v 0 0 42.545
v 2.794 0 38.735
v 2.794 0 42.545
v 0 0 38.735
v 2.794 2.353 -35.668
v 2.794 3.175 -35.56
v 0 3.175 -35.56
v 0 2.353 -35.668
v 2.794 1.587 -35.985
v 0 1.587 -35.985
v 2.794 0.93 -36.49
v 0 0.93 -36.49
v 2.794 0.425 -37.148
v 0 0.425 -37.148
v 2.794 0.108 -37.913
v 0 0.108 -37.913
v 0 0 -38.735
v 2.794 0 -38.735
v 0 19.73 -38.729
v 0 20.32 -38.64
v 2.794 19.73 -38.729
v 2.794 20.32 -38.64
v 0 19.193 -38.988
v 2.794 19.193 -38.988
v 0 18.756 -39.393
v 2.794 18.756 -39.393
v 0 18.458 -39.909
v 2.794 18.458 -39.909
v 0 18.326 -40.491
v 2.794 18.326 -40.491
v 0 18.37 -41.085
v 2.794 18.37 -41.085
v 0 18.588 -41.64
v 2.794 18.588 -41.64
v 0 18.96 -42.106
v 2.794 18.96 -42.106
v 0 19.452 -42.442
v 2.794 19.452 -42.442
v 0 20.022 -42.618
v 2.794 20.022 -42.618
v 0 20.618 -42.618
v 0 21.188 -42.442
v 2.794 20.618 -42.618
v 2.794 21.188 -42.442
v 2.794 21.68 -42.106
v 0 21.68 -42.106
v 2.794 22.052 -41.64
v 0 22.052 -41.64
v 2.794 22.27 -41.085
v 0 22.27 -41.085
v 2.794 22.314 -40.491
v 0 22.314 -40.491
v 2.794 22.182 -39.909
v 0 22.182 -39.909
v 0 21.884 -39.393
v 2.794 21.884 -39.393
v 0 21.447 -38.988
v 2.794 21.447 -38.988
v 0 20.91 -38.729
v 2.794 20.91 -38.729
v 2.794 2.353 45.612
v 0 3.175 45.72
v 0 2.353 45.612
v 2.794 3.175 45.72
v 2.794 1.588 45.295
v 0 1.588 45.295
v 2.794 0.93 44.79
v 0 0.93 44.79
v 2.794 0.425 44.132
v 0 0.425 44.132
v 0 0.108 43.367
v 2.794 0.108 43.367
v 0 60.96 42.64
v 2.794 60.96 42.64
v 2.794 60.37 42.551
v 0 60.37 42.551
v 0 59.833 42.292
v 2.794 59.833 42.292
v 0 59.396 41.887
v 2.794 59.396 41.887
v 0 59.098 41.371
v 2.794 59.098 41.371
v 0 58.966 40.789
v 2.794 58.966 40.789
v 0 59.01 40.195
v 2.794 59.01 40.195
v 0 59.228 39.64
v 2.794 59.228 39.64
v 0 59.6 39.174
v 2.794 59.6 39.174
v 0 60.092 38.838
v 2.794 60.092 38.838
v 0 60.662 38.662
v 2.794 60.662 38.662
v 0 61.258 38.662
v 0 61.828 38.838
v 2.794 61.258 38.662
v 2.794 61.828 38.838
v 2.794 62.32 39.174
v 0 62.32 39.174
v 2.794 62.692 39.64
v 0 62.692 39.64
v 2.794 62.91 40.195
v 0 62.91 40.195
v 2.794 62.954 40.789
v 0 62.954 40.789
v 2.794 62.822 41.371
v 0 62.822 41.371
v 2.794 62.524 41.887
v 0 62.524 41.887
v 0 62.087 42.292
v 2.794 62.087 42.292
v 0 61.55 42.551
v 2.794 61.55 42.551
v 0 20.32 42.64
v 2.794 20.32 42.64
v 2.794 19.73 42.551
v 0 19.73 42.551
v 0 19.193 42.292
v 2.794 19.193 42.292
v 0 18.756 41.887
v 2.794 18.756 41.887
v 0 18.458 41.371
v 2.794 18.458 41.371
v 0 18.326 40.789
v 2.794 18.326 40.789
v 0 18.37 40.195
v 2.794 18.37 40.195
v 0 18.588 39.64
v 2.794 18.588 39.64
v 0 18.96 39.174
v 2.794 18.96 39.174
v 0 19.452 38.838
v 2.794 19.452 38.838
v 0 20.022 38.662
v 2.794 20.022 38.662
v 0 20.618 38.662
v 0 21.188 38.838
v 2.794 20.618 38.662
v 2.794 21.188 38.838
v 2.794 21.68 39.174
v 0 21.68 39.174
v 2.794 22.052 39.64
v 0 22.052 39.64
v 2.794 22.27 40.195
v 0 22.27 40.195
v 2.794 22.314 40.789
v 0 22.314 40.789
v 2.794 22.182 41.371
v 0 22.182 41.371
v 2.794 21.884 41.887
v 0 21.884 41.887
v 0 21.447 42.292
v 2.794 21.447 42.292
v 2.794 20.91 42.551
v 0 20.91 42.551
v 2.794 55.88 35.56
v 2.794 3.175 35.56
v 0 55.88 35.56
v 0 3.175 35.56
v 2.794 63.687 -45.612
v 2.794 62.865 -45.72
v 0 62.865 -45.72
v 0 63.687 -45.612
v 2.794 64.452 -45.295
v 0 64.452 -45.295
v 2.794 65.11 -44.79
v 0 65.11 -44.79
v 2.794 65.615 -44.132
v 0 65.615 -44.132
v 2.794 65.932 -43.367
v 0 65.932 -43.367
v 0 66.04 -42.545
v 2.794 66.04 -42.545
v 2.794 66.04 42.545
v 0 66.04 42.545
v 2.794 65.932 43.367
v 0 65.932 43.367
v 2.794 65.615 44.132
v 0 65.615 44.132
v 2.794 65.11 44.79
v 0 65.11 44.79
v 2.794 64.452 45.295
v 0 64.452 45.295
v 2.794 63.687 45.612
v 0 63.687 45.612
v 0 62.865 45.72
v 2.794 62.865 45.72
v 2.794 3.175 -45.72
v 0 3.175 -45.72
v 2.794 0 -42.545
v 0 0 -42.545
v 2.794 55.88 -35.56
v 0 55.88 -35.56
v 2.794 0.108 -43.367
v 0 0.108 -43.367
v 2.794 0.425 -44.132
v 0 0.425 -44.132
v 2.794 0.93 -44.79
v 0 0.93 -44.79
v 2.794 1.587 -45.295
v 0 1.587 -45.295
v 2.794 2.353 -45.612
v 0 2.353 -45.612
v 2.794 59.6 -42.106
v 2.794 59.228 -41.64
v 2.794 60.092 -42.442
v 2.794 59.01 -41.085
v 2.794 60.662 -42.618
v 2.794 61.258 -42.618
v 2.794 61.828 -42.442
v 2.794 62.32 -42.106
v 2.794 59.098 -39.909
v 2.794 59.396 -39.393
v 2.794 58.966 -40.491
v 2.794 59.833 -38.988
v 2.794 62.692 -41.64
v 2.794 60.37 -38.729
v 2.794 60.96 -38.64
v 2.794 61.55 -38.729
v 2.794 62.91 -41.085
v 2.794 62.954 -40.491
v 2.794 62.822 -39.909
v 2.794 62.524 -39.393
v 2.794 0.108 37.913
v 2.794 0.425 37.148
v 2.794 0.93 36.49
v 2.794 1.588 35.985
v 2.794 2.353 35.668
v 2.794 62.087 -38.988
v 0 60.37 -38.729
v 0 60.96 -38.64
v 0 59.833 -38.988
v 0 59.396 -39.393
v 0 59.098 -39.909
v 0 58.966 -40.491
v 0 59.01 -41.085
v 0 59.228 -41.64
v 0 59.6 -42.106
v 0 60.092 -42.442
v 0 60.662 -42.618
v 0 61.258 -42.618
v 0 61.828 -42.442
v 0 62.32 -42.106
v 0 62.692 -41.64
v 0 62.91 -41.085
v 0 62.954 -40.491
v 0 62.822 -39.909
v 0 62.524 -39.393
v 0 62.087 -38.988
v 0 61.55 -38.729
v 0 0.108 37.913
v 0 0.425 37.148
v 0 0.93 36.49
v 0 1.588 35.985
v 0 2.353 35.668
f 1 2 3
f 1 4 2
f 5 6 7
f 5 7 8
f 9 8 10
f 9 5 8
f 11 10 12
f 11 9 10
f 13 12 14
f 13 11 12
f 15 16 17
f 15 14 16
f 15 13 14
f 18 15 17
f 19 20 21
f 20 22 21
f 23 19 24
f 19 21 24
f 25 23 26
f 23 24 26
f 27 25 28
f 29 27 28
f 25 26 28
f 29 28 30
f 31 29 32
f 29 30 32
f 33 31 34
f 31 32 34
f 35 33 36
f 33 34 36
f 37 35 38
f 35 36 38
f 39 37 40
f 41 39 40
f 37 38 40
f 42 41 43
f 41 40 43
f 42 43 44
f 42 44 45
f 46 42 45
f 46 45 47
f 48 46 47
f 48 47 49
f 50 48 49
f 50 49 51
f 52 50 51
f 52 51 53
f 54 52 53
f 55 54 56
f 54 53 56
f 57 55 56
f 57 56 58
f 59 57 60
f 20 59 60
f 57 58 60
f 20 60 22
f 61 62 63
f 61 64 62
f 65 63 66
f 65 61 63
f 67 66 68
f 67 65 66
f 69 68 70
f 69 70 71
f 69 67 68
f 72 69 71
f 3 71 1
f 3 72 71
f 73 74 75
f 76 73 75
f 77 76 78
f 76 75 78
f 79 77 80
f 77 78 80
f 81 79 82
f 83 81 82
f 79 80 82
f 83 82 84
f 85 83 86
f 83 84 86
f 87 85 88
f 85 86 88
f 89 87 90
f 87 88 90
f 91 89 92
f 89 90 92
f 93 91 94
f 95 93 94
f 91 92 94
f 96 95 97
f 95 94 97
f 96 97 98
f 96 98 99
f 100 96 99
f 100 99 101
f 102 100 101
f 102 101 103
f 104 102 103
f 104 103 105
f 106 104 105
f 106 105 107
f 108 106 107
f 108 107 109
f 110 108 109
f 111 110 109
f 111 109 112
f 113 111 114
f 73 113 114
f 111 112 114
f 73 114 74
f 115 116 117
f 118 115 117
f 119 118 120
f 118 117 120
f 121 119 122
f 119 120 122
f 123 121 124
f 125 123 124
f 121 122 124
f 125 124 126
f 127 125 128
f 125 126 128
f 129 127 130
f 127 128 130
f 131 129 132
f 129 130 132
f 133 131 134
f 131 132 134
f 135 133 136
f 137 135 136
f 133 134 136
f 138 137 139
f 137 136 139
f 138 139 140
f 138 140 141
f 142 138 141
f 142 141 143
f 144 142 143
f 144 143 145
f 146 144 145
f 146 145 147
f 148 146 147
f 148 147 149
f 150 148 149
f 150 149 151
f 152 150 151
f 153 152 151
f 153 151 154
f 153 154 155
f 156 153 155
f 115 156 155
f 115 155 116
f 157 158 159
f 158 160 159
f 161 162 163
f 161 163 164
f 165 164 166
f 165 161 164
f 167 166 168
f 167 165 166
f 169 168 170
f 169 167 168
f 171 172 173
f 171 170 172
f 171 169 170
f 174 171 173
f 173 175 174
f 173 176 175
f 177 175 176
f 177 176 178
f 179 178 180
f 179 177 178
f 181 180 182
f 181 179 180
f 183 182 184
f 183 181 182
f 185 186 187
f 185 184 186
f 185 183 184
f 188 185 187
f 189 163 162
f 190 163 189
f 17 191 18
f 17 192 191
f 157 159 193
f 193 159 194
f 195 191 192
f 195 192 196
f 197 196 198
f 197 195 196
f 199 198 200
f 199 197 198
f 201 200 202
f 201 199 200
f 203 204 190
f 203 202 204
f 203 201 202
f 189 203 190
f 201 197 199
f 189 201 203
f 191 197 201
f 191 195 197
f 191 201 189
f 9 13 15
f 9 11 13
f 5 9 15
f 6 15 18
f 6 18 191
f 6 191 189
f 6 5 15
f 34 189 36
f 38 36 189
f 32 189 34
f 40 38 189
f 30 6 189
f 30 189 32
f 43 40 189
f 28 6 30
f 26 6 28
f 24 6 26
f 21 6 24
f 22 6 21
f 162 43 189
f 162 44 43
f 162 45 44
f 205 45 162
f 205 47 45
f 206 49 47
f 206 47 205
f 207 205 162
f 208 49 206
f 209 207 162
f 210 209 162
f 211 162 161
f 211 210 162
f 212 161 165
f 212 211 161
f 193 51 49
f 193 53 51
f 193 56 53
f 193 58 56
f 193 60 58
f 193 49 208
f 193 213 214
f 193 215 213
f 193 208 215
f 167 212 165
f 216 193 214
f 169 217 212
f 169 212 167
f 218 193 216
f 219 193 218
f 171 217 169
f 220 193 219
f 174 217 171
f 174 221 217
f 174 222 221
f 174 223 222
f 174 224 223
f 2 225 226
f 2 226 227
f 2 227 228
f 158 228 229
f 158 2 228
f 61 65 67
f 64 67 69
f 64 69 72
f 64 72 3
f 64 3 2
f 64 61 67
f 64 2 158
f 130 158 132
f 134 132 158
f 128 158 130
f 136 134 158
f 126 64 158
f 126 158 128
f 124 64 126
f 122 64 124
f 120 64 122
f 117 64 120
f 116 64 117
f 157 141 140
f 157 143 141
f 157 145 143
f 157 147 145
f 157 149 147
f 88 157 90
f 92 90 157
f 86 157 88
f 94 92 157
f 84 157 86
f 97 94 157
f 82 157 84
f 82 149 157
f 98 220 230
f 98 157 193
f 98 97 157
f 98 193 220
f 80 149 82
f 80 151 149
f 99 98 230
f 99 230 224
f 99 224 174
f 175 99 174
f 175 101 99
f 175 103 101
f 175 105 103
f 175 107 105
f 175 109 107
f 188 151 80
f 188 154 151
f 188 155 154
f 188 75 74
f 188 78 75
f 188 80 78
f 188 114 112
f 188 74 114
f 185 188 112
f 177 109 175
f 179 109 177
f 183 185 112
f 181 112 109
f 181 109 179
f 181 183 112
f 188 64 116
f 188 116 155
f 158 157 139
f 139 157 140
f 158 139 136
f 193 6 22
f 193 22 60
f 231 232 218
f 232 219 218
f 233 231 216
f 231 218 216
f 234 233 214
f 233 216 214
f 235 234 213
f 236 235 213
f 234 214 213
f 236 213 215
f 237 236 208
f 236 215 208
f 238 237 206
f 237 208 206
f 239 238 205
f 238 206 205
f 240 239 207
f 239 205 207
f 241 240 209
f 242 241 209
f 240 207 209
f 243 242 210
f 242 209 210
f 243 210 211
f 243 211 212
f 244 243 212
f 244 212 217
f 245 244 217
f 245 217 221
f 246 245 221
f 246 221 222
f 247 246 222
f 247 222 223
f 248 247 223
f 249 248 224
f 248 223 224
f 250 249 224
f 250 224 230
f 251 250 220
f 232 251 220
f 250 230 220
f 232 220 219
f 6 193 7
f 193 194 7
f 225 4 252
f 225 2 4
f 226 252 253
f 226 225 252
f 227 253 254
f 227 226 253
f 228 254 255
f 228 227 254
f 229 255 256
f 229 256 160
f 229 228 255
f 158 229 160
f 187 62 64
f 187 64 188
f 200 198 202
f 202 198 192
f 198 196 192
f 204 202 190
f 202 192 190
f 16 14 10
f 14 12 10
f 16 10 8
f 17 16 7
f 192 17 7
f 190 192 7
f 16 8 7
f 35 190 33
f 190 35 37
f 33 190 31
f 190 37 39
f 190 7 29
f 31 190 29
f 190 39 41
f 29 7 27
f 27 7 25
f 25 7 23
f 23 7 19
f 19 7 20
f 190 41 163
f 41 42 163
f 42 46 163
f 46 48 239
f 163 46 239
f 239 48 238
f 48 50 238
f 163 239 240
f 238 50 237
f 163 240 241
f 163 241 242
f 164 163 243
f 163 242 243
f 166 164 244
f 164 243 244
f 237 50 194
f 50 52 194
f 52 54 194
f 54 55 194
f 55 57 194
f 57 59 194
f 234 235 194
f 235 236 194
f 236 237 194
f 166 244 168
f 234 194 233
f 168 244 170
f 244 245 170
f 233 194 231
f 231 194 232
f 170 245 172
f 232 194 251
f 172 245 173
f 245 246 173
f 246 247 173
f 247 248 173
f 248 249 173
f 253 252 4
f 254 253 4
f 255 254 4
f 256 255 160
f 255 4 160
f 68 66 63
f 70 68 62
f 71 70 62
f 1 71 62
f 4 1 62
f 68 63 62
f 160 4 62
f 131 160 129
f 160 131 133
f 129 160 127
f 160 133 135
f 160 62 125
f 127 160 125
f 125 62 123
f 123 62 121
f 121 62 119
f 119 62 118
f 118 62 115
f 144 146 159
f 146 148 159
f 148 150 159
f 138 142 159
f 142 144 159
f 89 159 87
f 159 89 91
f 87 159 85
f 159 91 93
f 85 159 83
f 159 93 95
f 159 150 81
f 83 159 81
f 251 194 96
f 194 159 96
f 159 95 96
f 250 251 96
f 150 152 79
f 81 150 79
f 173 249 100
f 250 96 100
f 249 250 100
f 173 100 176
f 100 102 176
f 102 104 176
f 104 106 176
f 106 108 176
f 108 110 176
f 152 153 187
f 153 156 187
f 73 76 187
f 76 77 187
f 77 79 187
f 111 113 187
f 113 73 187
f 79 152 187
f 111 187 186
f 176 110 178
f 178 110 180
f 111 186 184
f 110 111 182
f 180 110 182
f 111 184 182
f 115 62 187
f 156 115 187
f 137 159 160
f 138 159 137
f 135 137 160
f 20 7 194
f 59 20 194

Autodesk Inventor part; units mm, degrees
ref_plane "YZ Plane" through (0, 0, 0) normal (1, 0, 0) x (0, 1, 0)
ref_plane "XZ Plane" through (0, 0, 0) normal (0, 1, 0) x (-1, 0, 0)
ref_plane "XY Plane" through (0, 0, 0) normal (0, 0, 1) x (1, 0, 0)
sketch "Sketch1" plane through (0, 0, 0) normal (1, 0, 0) x (0, 1, 0)
  line L0 (0, 45.72) -> (66.04, 45.72)
  line L1 (66.04, 45.72) -> (66.04, -45.72)
  line L2 (66.04, -45.72) -> (0, -45.72)
  line L3 (0, 35.56) -> (55.88, 35.56)
  line L4 (55.88, 35.56) -> (55.88, -35.56)
  line L5 (55.88, -35.56) -> (0, -35.56)
  line L6 (55.88, 35.56) -> (66.04, 45.72) construction
  line L7 (55.88, -35.56) -> (66.04, -45.72) construction
  line L8 (0, 45.72) -> (0, -45.72) construction
  line L9 (0, -45.72) -> (0, -35.56)
  line L10 (0, 35.56) -> (0, 45.72)
  point P0 (0, 0)
  point P1 (60.96, 40.64)
  point P2 (60.96, -40.64)
  point P3 (20.32, -40.64)
  point P4 (20.32, 40.64)
  point P5 (0, 0)
  dimension "d0" = 71.12
  dimension "d1" = 10.16
  dimension "d2" = 10.16
  dimension "d3" = 10.16
  dimension "d4" = 66.04
  dimension "d7" = 40.64
extrude "Extrusion2" add sketch "Sketch1" along normal blind 2.794
hole "Hole2" at (0, 60.96, 40.64) at (0, 60.96, -40.64) at (0, 20.32, -40.64) at (0, 20.32, 40.64) direction (1, 0, 0) diameter 4 end through all
fillet "Fillet1" radius 3.175 6 edges at (1.397, 0, -35.56) (1.397, 0, 35.56) (1.397, 0, -45.72) (1.397, 0, 45.72) (1.397, 66.04, 45.72) (1.397, 66.04, -45.72)
equation "\"d2\" = d1"
equation "\"d3\" = d2"
properties part number "ArmSpacer" material "Polycarbonate, Smoke"
